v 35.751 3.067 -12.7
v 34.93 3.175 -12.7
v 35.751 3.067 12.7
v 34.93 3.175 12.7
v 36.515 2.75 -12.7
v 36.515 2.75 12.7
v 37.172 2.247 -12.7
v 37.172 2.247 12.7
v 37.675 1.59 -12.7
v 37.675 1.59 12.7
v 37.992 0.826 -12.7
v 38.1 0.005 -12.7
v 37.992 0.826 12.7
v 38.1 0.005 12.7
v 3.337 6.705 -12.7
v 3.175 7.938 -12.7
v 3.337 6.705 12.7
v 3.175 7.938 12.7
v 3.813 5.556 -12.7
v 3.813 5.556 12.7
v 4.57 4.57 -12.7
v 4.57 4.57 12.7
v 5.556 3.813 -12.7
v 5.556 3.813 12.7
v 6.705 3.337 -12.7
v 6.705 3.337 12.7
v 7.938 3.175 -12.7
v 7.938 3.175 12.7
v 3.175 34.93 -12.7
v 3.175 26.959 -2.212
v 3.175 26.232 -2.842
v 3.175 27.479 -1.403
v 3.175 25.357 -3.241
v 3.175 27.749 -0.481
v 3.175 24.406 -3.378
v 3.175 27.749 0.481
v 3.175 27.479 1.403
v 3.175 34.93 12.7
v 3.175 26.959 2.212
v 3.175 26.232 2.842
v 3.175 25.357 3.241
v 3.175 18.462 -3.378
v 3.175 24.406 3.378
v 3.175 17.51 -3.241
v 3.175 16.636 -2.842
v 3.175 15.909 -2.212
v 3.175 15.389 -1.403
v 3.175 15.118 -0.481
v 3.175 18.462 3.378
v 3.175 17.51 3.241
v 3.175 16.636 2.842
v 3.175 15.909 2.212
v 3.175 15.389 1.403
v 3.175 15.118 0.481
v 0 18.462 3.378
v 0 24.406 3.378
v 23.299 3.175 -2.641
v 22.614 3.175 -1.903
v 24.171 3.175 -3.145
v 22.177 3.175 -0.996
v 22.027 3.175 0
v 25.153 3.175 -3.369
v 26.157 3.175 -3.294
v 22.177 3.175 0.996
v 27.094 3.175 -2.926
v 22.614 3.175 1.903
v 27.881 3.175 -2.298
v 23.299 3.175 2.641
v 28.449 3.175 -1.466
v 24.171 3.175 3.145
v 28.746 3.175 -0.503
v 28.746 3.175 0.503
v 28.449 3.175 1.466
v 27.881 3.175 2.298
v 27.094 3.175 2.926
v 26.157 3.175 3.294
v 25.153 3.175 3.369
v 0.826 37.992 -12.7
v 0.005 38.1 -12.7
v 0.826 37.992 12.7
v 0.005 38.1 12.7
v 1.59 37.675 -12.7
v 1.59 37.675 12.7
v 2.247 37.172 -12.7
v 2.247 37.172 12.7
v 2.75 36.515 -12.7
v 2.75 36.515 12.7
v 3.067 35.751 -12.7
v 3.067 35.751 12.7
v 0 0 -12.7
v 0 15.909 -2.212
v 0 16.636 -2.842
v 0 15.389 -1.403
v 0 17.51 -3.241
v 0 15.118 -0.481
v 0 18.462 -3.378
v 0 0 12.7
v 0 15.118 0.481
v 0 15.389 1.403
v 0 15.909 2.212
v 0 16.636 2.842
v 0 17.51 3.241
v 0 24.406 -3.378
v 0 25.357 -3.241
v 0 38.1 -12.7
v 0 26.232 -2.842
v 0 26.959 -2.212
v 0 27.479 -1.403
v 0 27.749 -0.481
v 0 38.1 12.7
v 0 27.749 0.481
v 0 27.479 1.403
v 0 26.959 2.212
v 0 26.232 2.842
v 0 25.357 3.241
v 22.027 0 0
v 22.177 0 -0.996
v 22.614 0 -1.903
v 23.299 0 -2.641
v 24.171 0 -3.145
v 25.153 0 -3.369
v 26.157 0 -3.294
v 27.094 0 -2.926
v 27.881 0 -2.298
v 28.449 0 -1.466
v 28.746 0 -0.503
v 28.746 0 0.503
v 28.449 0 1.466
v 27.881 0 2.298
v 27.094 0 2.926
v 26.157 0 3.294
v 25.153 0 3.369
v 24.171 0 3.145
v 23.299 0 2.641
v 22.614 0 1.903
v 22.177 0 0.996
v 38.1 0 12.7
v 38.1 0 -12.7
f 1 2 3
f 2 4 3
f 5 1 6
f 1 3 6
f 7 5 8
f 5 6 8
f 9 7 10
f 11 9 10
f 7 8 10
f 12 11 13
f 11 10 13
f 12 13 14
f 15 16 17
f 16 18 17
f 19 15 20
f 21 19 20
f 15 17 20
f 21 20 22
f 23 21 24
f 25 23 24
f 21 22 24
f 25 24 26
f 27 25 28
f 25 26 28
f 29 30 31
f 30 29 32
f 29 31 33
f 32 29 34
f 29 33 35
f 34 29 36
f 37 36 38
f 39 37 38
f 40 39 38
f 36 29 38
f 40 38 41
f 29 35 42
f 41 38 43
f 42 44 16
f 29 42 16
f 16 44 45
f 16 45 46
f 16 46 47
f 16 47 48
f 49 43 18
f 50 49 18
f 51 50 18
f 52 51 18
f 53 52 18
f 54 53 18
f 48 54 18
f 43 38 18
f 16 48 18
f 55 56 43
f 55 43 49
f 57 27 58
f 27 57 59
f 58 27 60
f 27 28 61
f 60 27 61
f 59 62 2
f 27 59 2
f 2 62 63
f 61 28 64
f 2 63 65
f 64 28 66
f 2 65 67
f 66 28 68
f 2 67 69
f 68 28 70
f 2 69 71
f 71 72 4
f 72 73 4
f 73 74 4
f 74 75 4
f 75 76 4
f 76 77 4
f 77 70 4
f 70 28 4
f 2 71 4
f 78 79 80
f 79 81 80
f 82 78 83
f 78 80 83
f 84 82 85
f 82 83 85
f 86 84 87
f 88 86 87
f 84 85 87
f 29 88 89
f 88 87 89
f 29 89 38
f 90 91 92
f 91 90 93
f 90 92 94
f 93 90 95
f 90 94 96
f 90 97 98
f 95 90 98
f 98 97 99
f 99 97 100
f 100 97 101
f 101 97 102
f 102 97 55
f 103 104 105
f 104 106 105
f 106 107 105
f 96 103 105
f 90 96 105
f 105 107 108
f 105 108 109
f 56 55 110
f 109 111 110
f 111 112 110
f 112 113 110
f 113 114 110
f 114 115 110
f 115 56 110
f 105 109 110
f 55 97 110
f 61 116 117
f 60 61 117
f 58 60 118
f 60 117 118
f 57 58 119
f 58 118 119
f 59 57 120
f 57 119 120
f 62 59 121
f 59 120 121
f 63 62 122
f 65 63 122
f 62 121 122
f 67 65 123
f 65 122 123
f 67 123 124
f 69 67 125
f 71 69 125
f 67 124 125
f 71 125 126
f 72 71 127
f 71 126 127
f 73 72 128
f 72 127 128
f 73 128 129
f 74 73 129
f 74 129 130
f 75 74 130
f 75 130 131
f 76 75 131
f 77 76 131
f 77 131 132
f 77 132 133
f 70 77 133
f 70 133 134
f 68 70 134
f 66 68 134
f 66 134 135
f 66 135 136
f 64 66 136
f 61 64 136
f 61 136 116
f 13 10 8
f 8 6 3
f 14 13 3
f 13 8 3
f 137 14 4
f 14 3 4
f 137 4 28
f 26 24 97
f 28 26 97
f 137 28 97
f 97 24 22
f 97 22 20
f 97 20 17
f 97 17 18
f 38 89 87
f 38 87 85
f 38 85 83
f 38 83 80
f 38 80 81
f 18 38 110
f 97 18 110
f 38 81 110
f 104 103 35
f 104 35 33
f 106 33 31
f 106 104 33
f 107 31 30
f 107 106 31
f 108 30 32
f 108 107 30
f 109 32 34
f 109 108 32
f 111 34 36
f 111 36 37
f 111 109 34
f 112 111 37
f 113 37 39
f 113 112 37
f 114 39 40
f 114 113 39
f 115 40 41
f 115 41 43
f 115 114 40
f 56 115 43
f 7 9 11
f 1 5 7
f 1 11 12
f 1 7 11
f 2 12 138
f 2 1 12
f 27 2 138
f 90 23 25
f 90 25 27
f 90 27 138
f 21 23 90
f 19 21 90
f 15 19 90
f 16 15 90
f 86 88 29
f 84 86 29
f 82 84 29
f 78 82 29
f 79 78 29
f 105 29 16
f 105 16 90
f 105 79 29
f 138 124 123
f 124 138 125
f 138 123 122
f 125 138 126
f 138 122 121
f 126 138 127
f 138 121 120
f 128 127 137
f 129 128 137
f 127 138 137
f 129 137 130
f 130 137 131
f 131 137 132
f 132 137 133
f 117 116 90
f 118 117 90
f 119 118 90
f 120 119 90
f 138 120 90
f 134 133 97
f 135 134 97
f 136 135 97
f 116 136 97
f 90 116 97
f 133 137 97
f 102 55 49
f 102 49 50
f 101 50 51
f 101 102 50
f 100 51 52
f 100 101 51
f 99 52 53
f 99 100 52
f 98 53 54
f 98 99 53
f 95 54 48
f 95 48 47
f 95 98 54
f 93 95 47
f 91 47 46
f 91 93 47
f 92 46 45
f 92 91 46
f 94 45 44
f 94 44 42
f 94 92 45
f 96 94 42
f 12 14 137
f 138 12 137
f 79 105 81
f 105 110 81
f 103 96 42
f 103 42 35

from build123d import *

# Parameters (mm, degrees)
BASESTEELANGLE_DEPTH        = 12.7
F_1_4_CLEARANCE_HOLE1_D     = 6.7564
F_1_4_CLEARANCE_SLOT1_DEPTH = 3.175


# Read off the part's stored shape, not the designer's step: 1/4 Clearance Slot1
with BuildPart() as part:
    # Sketch1 → BaseSteelAngle (new, symmetric)
    with BuildSketch(Plane.XY):
        with BuildLine():
            Line((0, 0), (0, 38.1))
            Line((0, 38.1), (0.00508, 38.1))
            ThreePointArc((0.00508, 38.1), (2.246551928, 37.171551928), (3.175, 34.93008))
            Line((3.175, 34.93008), (3.175, 7.9375))
            ThreePointArc((3.175, 7.9375), (4.569903955, 4.569903955), (7.9375, 3.175))
            Line((7.9375, 3.175), (34.93008, 3.175))
            ThreePointArc((34.93008, 3.175), (37.171551928, 2.246551928), (38.1, 0.00508))
            Line((38.1, 0.00508), (38.1, 0))
            Line((38.1, 0), (0, 0))
        make_face()
    extrude(amount=BASESTEELANGLE_DEPTH, both=True)

    # 1/4 Clearance Hole1 (through all)
    with Locations(Plane(origin=(25.40508, 3.175, 0), x_dir=(1, 0, 0), z_dir=(0, 1, 0))):
        with Locations((0, 0)):
            Hole(F_1_4_CLEARANCE_HOLE1_D / 2)

    # 1/4 Clearance Slot1 outline → 1/4 Clearance Slot1 (cut)
    with BuildSketch(Plane.YZ):
        with BuildLine():
            Line((24.40559, 3.3782), (18.46199, 3.3782))
            ThreePointArc((18.46199, 3.3782), (15.08379, 0), (18.46199, -3.3782))
            Line((18.46199, -3.3782), (24.40559, -3.3782))
            ThreePointArc((24.40559, -3.3782), (27.78379, 0), (24.40559, 3.3782))
        make_face()
    extrude(amount=F_1_4_CLEARANCE_SLOT1_DEPTH, mode=Mode.SUBTRACT)


solid = part.part
